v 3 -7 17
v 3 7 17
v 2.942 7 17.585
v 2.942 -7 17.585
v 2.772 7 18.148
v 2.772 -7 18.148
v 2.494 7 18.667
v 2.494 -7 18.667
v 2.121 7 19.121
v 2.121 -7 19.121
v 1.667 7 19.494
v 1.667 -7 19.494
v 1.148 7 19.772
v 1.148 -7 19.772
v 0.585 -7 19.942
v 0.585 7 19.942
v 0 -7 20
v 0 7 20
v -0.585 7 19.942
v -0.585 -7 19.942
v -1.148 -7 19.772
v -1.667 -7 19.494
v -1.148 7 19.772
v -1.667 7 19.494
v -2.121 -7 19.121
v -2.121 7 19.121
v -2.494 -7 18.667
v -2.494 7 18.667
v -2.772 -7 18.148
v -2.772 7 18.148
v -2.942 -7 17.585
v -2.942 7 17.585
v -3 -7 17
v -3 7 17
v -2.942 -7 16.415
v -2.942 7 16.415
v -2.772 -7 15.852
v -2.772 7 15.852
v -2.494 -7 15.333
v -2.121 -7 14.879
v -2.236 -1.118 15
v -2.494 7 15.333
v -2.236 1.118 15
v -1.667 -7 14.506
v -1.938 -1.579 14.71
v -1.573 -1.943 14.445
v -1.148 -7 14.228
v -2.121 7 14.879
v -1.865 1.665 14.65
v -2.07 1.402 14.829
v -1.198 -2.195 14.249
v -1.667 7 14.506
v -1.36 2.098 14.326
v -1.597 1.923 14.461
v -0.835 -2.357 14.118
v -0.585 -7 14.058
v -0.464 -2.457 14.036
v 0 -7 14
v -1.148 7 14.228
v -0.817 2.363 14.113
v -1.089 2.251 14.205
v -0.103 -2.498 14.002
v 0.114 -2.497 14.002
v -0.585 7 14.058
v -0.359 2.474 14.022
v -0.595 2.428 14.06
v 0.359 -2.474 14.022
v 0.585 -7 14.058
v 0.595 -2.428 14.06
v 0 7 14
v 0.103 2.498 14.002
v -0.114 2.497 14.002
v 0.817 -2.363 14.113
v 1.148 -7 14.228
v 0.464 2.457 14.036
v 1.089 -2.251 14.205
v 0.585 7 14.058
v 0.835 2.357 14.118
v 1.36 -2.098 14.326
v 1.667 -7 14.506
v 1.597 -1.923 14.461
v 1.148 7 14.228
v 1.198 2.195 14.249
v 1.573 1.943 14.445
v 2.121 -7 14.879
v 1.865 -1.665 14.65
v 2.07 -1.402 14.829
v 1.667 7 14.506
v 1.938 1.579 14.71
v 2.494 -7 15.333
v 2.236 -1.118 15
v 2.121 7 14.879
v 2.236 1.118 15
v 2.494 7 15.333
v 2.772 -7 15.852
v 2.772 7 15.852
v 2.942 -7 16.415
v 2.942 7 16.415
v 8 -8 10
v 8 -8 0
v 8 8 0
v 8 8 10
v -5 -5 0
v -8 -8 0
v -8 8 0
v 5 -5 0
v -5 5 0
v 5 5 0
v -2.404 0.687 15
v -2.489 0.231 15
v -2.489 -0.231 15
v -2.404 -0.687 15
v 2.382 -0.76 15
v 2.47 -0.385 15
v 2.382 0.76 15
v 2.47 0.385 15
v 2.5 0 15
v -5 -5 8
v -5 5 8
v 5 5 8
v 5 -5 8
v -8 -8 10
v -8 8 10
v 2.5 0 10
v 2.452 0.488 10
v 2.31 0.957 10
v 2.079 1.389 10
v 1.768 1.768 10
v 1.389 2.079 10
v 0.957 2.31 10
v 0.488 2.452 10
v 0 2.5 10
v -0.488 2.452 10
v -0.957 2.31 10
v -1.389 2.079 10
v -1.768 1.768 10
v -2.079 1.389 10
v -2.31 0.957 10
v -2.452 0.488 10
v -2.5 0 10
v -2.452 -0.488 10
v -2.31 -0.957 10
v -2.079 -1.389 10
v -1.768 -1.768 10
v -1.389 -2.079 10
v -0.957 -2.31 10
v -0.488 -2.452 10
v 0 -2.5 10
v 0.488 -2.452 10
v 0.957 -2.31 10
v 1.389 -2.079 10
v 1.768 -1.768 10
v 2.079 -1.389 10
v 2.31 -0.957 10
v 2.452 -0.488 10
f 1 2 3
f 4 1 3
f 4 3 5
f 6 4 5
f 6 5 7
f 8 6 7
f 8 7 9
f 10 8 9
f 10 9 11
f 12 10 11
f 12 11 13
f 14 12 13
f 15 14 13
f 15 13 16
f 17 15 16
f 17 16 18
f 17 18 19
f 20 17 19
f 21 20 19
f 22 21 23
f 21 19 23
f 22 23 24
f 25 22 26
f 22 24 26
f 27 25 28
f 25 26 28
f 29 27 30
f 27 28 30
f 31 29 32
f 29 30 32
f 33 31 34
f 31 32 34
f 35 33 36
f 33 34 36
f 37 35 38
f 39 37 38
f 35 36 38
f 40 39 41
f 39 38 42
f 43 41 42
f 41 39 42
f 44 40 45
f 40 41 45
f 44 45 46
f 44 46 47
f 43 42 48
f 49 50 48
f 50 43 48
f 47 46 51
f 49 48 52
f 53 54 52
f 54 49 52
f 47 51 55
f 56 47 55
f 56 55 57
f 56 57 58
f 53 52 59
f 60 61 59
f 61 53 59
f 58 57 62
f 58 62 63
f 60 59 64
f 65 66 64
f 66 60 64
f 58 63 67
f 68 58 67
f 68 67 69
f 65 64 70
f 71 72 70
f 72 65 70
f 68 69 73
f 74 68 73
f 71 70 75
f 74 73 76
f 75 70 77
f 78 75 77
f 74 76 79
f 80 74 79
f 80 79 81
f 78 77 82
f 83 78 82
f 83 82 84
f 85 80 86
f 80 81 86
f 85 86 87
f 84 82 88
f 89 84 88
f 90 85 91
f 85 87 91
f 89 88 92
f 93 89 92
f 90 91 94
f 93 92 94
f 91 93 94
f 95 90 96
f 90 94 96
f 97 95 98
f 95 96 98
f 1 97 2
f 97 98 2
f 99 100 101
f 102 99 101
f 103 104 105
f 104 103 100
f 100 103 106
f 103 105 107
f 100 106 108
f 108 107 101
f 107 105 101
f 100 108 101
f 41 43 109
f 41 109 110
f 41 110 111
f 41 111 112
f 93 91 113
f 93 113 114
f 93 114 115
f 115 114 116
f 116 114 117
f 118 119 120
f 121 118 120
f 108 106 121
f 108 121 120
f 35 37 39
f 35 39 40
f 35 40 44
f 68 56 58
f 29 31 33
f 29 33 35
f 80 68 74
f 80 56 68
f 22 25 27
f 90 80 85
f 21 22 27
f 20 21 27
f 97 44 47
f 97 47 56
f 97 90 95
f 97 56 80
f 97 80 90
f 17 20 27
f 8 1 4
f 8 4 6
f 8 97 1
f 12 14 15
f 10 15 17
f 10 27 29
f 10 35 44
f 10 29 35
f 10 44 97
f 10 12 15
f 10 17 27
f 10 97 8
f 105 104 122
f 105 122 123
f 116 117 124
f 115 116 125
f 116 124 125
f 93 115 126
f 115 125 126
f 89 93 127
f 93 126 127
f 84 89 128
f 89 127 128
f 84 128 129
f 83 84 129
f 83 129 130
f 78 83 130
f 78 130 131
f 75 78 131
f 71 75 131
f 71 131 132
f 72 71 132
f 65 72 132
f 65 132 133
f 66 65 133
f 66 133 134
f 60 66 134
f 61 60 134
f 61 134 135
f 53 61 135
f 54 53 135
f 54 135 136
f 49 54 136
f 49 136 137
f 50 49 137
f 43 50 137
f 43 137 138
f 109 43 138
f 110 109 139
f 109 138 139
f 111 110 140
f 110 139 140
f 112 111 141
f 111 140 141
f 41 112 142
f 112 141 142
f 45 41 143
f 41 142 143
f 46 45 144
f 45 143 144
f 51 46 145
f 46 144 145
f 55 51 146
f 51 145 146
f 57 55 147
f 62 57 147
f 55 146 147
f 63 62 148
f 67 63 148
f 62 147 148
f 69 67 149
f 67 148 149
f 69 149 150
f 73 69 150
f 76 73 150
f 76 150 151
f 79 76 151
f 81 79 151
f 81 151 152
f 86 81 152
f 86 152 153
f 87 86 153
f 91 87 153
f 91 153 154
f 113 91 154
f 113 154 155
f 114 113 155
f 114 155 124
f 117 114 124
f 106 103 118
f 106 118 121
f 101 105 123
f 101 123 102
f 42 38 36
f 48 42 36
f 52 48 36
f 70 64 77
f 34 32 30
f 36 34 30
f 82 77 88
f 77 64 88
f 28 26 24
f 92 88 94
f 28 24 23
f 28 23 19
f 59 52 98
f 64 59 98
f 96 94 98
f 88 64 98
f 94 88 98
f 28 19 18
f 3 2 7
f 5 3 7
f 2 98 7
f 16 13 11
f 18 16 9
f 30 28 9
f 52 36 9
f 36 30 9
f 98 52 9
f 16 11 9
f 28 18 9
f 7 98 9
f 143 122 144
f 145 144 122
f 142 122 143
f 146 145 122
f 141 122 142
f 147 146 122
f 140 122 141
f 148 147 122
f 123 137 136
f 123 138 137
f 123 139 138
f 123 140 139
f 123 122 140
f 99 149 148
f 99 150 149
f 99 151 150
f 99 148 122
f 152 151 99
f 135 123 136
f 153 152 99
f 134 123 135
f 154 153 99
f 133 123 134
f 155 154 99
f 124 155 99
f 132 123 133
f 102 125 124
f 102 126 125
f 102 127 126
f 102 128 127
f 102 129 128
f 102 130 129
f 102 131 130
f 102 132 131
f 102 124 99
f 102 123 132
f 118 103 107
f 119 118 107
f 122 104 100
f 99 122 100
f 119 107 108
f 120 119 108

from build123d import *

# Parameters (mm, degrees)
BOX001_W       = 10
BOX001_H       = 10
BOX001_DEPTH   = 8
CYLINDER_R     = 2.5
CYLINDER_DEPTH = 5
SKETCH_R       = 3
EXTRUDE_DEPTH  = 14
BOX_W          = 16
BOX_H          = 16
BOX_DEPTH      = 10


with BuildPart() as cube001:
    # Box001 → Box001 (new body)
    with BuildSketch(Plane(origin=(-5, -5, 0), x_dir=(1, 0, 0), z_dir=(0, 0, 1))):
        with Locations((5, 5)):
            Rectangle(BOX001_W, BOX001_H)
    extrude(amount=BOX001_DEPTH)


with BuildPart() as cylinder:
    # Cylinder → Cylinder (new body)
    with BuildSketch(Plane.XY.offset(10)):
        Circle(CYLINDER_R)
    extrude(amount=CYLINDER_DEPTH)


with BuildPart() as extrude_body:
    # Sketch (on Cylinder) → Extrude (new body)
    with BuildSketch(Plane(origin=(0, 0, 10), x_dir=(1, 0, 0), z_dir=(0, -1, 0))):
        with Locations((0, 7)):
            Circle(SKETCH_R)
    extrude(amount=EXTRUDE_DEPTH)


with BuildPart() as extrude_body_1:
    # Extrude placement: moved
    add(extrude_body.part.moved(Location((0, 7, 0))))


with BuildPart() as cut:
    # Box → Box (new body)
    with BuildSketch(Plane(origin=(-8, -8, 0), x_dir=(1, 0, 0), z_dir=(0, 0, 1))):
        with Locations((8, 8)):
            Rectangle(BOX_W, BOX_H)
    extrude(amount=BOX_DEPTH)

    # Fusion: union Cylinder, Extrude body
    add(cylinder.part)
    add(extrude_body_1.part)

    # Cut: cut Cube001
    add(cube001.part, mode=Mode.SUBTRACT)


solid = cut.part
